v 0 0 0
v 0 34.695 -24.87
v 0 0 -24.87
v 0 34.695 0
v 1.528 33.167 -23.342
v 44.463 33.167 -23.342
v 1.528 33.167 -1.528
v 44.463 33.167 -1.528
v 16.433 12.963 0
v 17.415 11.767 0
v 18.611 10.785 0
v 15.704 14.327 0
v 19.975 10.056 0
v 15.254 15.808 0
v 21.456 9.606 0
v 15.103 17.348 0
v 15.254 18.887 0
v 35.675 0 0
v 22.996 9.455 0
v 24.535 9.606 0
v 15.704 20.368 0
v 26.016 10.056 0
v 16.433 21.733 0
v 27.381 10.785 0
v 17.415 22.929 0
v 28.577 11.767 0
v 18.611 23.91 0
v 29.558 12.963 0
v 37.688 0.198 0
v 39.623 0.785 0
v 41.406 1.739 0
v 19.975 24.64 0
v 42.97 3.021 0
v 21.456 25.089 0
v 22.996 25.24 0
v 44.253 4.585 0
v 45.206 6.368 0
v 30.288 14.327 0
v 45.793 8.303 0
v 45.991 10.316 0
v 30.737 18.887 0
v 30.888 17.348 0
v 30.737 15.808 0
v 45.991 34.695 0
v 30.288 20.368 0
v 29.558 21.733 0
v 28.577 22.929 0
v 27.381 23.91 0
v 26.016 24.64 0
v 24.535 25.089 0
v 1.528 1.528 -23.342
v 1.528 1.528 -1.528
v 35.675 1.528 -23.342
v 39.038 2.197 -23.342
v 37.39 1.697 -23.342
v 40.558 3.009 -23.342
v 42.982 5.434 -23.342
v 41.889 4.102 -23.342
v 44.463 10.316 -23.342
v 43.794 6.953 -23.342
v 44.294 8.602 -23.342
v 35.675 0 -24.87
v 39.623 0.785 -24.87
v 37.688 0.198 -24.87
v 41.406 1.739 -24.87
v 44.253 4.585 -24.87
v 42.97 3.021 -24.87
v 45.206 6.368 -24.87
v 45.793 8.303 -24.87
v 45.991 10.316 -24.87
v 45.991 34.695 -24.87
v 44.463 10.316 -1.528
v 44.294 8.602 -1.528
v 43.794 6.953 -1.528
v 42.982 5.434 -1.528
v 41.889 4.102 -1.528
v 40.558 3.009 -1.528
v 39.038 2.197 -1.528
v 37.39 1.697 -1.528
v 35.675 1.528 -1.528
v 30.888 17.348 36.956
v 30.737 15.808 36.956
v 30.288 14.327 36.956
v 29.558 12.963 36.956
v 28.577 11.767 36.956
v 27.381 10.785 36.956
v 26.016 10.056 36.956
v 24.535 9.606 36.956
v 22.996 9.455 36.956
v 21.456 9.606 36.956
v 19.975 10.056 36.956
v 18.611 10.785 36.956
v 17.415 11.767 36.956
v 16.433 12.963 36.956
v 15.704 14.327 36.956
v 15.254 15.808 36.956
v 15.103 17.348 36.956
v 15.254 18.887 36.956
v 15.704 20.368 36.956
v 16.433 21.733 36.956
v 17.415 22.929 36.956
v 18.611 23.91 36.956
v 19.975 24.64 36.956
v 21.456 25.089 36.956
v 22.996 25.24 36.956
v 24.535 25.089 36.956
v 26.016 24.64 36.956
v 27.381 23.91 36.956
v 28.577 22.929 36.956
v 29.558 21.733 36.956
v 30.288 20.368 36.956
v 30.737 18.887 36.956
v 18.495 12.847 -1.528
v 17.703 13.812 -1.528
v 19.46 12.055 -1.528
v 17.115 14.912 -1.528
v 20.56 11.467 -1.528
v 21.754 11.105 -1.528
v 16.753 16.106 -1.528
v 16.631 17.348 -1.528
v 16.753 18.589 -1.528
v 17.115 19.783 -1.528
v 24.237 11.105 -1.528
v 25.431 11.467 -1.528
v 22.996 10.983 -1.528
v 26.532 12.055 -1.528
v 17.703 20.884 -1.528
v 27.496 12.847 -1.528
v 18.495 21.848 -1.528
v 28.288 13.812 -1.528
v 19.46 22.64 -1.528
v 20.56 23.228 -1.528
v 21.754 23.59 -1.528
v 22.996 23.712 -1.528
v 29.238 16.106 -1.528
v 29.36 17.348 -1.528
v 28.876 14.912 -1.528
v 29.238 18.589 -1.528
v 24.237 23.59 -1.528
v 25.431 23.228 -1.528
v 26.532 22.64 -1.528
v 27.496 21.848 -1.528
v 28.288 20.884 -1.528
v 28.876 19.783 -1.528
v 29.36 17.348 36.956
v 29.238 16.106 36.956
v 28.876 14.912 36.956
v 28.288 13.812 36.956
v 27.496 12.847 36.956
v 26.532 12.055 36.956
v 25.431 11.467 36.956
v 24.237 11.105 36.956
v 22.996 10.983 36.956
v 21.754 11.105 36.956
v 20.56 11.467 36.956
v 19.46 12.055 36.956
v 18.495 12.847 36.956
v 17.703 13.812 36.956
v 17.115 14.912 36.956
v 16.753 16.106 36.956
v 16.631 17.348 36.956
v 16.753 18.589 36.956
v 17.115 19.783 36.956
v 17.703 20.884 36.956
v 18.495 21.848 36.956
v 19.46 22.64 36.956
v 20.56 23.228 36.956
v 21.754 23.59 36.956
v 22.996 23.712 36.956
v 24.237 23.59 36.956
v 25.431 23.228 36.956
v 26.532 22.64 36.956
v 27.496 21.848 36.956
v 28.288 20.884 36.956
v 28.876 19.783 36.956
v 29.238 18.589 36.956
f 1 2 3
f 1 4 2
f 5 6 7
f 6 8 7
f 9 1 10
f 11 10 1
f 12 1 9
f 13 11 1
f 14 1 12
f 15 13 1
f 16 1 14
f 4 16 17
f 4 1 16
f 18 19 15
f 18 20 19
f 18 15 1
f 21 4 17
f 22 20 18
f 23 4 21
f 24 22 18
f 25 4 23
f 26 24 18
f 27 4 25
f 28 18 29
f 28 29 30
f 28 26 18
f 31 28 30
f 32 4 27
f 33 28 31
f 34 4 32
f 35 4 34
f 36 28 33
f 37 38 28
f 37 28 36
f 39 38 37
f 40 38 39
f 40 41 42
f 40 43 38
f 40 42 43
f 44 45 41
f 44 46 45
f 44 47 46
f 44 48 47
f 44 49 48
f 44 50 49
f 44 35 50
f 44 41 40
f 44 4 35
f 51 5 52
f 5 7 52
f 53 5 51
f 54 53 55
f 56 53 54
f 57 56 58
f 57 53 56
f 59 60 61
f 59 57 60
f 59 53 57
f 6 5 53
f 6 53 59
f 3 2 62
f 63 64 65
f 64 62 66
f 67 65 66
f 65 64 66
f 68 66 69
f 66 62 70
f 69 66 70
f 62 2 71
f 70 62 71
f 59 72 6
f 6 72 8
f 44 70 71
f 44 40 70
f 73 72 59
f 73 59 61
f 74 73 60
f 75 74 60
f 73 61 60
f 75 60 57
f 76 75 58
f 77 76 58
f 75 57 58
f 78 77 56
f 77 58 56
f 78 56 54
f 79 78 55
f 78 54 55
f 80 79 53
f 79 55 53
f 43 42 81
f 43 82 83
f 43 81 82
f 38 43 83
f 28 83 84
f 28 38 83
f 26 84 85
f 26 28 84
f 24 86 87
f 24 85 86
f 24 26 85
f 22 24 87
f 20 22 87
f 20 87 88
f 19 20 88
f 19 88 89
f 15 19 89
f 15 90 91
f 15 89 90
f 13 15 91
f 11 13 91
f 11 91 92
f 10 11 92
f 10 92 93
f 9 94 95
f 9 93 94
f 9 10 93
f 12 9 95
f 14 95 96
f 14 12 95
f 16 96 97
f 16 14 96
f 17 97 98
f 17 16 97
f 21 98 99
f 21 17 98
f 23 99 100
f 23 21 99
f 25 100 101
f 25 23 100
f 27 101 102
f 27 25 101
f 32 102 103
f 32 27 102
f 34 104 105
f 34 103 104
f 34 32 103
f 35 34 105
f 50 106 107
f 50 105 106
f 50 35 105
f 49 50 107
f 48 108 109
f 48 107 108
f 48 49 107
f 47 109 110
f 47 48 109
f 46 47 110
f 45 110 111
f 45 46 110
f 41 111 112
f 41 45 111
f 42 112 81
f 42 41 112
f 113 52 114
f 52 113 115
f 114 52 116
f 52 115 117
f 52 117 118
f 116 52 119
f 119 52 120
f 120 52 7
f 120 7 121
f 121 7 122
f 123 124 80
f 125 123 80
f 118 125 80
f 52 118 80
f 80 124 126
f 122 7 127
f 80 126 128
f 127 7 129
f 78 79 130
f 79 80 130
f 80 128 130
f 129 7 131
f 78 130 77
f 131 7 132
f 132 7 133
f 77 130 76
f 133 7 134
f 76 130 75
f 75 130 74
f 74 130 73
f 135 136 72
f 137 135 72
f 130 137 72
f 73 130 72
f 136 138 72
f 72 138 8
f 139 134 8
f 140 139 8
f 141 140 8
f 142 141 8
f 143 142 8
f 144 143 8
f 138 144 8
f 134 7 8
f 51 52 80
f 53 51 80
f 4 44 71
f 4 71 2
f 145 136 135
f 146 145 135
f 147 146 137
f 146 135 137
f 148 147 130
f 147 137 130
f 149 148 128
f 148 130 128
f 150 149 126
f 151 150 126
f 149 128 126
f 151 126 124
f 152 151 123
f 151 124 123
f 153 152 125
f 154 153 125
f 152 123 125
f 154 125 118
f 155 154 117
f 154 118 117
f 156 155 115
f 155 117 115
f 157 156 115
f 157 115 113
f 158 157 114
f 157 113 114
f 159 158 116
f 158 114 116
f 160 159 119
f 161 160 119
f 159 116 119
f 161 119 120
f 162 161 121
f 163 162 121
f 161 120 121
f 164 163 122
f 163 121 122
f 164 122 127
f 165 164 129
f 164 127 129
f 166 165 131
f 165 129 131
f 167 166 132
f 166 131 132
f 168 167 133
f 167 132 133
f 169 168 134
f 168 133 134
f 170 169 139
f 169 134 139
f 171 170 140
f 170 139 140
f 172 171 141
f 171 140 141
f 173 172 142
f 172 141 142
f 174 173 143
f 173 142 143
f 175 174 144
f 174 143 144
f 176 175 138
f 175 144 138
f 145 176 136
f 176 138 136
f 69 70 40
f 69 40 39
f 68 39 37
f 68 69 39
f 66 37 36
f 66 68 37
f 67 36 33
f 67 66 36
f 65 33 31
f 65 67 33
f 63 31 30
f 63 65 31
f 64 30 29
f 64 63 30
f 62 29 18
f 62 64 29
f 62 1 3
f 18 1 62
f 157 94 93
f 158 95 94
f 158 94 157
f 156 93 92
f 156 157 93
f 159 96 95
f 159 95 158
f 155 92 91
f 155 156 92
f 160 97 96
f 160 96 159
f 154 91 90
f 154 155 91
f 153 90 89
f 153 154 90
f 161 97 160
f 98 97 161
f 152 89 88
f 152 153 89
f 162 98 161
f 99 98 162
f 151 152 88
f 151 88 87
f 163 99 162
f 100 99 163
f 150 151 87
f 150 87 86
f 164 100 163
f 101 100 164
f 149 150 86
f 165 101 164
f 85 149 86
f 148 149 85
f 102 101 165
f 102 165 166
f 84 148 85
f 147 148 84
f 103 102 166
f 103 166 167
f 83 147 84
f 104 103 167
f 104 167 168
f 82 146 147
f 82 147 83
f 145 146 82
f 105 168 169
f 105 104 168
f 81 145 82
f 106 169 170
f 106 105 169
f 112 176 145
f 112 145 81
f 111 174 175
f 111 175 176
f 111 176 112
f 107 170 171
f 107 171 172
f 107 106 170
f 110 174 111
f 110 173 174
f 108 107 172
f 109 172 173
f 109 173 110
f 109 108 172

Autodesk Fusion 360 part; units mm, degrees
sketch "Sketch1" plane through (0, 0, 0) normal (0, 0, 1) x (1, 0, 0)
  line L0 (0, 0) -> (45.9912, 0)
  line L1 (45.9912, 0) -> (45.9912, 34.6951)
  line L2 (45.9912, 34.6951) -> (0, 34.6951)
  line L3 (0, 34.6951) -> (0, 0)
  circle A0 centre (22.9956, 17.3476) radius 7.8928
extrude "Extrude1" add sketch "Sketch1" against normal blind 24.87 contours L0 L1 L2 L3 | A0
extrude "Extrude2" add sketch "Sketch1" along normal blind 36.956 contours A0
fillet "Fillet1" radius 10.316 1 edges at (45.9912, 0, -12.435)
shell "Shell1" thickness 1.528 removed faces 1 at (18.3486, 16.3767, 36.956)
